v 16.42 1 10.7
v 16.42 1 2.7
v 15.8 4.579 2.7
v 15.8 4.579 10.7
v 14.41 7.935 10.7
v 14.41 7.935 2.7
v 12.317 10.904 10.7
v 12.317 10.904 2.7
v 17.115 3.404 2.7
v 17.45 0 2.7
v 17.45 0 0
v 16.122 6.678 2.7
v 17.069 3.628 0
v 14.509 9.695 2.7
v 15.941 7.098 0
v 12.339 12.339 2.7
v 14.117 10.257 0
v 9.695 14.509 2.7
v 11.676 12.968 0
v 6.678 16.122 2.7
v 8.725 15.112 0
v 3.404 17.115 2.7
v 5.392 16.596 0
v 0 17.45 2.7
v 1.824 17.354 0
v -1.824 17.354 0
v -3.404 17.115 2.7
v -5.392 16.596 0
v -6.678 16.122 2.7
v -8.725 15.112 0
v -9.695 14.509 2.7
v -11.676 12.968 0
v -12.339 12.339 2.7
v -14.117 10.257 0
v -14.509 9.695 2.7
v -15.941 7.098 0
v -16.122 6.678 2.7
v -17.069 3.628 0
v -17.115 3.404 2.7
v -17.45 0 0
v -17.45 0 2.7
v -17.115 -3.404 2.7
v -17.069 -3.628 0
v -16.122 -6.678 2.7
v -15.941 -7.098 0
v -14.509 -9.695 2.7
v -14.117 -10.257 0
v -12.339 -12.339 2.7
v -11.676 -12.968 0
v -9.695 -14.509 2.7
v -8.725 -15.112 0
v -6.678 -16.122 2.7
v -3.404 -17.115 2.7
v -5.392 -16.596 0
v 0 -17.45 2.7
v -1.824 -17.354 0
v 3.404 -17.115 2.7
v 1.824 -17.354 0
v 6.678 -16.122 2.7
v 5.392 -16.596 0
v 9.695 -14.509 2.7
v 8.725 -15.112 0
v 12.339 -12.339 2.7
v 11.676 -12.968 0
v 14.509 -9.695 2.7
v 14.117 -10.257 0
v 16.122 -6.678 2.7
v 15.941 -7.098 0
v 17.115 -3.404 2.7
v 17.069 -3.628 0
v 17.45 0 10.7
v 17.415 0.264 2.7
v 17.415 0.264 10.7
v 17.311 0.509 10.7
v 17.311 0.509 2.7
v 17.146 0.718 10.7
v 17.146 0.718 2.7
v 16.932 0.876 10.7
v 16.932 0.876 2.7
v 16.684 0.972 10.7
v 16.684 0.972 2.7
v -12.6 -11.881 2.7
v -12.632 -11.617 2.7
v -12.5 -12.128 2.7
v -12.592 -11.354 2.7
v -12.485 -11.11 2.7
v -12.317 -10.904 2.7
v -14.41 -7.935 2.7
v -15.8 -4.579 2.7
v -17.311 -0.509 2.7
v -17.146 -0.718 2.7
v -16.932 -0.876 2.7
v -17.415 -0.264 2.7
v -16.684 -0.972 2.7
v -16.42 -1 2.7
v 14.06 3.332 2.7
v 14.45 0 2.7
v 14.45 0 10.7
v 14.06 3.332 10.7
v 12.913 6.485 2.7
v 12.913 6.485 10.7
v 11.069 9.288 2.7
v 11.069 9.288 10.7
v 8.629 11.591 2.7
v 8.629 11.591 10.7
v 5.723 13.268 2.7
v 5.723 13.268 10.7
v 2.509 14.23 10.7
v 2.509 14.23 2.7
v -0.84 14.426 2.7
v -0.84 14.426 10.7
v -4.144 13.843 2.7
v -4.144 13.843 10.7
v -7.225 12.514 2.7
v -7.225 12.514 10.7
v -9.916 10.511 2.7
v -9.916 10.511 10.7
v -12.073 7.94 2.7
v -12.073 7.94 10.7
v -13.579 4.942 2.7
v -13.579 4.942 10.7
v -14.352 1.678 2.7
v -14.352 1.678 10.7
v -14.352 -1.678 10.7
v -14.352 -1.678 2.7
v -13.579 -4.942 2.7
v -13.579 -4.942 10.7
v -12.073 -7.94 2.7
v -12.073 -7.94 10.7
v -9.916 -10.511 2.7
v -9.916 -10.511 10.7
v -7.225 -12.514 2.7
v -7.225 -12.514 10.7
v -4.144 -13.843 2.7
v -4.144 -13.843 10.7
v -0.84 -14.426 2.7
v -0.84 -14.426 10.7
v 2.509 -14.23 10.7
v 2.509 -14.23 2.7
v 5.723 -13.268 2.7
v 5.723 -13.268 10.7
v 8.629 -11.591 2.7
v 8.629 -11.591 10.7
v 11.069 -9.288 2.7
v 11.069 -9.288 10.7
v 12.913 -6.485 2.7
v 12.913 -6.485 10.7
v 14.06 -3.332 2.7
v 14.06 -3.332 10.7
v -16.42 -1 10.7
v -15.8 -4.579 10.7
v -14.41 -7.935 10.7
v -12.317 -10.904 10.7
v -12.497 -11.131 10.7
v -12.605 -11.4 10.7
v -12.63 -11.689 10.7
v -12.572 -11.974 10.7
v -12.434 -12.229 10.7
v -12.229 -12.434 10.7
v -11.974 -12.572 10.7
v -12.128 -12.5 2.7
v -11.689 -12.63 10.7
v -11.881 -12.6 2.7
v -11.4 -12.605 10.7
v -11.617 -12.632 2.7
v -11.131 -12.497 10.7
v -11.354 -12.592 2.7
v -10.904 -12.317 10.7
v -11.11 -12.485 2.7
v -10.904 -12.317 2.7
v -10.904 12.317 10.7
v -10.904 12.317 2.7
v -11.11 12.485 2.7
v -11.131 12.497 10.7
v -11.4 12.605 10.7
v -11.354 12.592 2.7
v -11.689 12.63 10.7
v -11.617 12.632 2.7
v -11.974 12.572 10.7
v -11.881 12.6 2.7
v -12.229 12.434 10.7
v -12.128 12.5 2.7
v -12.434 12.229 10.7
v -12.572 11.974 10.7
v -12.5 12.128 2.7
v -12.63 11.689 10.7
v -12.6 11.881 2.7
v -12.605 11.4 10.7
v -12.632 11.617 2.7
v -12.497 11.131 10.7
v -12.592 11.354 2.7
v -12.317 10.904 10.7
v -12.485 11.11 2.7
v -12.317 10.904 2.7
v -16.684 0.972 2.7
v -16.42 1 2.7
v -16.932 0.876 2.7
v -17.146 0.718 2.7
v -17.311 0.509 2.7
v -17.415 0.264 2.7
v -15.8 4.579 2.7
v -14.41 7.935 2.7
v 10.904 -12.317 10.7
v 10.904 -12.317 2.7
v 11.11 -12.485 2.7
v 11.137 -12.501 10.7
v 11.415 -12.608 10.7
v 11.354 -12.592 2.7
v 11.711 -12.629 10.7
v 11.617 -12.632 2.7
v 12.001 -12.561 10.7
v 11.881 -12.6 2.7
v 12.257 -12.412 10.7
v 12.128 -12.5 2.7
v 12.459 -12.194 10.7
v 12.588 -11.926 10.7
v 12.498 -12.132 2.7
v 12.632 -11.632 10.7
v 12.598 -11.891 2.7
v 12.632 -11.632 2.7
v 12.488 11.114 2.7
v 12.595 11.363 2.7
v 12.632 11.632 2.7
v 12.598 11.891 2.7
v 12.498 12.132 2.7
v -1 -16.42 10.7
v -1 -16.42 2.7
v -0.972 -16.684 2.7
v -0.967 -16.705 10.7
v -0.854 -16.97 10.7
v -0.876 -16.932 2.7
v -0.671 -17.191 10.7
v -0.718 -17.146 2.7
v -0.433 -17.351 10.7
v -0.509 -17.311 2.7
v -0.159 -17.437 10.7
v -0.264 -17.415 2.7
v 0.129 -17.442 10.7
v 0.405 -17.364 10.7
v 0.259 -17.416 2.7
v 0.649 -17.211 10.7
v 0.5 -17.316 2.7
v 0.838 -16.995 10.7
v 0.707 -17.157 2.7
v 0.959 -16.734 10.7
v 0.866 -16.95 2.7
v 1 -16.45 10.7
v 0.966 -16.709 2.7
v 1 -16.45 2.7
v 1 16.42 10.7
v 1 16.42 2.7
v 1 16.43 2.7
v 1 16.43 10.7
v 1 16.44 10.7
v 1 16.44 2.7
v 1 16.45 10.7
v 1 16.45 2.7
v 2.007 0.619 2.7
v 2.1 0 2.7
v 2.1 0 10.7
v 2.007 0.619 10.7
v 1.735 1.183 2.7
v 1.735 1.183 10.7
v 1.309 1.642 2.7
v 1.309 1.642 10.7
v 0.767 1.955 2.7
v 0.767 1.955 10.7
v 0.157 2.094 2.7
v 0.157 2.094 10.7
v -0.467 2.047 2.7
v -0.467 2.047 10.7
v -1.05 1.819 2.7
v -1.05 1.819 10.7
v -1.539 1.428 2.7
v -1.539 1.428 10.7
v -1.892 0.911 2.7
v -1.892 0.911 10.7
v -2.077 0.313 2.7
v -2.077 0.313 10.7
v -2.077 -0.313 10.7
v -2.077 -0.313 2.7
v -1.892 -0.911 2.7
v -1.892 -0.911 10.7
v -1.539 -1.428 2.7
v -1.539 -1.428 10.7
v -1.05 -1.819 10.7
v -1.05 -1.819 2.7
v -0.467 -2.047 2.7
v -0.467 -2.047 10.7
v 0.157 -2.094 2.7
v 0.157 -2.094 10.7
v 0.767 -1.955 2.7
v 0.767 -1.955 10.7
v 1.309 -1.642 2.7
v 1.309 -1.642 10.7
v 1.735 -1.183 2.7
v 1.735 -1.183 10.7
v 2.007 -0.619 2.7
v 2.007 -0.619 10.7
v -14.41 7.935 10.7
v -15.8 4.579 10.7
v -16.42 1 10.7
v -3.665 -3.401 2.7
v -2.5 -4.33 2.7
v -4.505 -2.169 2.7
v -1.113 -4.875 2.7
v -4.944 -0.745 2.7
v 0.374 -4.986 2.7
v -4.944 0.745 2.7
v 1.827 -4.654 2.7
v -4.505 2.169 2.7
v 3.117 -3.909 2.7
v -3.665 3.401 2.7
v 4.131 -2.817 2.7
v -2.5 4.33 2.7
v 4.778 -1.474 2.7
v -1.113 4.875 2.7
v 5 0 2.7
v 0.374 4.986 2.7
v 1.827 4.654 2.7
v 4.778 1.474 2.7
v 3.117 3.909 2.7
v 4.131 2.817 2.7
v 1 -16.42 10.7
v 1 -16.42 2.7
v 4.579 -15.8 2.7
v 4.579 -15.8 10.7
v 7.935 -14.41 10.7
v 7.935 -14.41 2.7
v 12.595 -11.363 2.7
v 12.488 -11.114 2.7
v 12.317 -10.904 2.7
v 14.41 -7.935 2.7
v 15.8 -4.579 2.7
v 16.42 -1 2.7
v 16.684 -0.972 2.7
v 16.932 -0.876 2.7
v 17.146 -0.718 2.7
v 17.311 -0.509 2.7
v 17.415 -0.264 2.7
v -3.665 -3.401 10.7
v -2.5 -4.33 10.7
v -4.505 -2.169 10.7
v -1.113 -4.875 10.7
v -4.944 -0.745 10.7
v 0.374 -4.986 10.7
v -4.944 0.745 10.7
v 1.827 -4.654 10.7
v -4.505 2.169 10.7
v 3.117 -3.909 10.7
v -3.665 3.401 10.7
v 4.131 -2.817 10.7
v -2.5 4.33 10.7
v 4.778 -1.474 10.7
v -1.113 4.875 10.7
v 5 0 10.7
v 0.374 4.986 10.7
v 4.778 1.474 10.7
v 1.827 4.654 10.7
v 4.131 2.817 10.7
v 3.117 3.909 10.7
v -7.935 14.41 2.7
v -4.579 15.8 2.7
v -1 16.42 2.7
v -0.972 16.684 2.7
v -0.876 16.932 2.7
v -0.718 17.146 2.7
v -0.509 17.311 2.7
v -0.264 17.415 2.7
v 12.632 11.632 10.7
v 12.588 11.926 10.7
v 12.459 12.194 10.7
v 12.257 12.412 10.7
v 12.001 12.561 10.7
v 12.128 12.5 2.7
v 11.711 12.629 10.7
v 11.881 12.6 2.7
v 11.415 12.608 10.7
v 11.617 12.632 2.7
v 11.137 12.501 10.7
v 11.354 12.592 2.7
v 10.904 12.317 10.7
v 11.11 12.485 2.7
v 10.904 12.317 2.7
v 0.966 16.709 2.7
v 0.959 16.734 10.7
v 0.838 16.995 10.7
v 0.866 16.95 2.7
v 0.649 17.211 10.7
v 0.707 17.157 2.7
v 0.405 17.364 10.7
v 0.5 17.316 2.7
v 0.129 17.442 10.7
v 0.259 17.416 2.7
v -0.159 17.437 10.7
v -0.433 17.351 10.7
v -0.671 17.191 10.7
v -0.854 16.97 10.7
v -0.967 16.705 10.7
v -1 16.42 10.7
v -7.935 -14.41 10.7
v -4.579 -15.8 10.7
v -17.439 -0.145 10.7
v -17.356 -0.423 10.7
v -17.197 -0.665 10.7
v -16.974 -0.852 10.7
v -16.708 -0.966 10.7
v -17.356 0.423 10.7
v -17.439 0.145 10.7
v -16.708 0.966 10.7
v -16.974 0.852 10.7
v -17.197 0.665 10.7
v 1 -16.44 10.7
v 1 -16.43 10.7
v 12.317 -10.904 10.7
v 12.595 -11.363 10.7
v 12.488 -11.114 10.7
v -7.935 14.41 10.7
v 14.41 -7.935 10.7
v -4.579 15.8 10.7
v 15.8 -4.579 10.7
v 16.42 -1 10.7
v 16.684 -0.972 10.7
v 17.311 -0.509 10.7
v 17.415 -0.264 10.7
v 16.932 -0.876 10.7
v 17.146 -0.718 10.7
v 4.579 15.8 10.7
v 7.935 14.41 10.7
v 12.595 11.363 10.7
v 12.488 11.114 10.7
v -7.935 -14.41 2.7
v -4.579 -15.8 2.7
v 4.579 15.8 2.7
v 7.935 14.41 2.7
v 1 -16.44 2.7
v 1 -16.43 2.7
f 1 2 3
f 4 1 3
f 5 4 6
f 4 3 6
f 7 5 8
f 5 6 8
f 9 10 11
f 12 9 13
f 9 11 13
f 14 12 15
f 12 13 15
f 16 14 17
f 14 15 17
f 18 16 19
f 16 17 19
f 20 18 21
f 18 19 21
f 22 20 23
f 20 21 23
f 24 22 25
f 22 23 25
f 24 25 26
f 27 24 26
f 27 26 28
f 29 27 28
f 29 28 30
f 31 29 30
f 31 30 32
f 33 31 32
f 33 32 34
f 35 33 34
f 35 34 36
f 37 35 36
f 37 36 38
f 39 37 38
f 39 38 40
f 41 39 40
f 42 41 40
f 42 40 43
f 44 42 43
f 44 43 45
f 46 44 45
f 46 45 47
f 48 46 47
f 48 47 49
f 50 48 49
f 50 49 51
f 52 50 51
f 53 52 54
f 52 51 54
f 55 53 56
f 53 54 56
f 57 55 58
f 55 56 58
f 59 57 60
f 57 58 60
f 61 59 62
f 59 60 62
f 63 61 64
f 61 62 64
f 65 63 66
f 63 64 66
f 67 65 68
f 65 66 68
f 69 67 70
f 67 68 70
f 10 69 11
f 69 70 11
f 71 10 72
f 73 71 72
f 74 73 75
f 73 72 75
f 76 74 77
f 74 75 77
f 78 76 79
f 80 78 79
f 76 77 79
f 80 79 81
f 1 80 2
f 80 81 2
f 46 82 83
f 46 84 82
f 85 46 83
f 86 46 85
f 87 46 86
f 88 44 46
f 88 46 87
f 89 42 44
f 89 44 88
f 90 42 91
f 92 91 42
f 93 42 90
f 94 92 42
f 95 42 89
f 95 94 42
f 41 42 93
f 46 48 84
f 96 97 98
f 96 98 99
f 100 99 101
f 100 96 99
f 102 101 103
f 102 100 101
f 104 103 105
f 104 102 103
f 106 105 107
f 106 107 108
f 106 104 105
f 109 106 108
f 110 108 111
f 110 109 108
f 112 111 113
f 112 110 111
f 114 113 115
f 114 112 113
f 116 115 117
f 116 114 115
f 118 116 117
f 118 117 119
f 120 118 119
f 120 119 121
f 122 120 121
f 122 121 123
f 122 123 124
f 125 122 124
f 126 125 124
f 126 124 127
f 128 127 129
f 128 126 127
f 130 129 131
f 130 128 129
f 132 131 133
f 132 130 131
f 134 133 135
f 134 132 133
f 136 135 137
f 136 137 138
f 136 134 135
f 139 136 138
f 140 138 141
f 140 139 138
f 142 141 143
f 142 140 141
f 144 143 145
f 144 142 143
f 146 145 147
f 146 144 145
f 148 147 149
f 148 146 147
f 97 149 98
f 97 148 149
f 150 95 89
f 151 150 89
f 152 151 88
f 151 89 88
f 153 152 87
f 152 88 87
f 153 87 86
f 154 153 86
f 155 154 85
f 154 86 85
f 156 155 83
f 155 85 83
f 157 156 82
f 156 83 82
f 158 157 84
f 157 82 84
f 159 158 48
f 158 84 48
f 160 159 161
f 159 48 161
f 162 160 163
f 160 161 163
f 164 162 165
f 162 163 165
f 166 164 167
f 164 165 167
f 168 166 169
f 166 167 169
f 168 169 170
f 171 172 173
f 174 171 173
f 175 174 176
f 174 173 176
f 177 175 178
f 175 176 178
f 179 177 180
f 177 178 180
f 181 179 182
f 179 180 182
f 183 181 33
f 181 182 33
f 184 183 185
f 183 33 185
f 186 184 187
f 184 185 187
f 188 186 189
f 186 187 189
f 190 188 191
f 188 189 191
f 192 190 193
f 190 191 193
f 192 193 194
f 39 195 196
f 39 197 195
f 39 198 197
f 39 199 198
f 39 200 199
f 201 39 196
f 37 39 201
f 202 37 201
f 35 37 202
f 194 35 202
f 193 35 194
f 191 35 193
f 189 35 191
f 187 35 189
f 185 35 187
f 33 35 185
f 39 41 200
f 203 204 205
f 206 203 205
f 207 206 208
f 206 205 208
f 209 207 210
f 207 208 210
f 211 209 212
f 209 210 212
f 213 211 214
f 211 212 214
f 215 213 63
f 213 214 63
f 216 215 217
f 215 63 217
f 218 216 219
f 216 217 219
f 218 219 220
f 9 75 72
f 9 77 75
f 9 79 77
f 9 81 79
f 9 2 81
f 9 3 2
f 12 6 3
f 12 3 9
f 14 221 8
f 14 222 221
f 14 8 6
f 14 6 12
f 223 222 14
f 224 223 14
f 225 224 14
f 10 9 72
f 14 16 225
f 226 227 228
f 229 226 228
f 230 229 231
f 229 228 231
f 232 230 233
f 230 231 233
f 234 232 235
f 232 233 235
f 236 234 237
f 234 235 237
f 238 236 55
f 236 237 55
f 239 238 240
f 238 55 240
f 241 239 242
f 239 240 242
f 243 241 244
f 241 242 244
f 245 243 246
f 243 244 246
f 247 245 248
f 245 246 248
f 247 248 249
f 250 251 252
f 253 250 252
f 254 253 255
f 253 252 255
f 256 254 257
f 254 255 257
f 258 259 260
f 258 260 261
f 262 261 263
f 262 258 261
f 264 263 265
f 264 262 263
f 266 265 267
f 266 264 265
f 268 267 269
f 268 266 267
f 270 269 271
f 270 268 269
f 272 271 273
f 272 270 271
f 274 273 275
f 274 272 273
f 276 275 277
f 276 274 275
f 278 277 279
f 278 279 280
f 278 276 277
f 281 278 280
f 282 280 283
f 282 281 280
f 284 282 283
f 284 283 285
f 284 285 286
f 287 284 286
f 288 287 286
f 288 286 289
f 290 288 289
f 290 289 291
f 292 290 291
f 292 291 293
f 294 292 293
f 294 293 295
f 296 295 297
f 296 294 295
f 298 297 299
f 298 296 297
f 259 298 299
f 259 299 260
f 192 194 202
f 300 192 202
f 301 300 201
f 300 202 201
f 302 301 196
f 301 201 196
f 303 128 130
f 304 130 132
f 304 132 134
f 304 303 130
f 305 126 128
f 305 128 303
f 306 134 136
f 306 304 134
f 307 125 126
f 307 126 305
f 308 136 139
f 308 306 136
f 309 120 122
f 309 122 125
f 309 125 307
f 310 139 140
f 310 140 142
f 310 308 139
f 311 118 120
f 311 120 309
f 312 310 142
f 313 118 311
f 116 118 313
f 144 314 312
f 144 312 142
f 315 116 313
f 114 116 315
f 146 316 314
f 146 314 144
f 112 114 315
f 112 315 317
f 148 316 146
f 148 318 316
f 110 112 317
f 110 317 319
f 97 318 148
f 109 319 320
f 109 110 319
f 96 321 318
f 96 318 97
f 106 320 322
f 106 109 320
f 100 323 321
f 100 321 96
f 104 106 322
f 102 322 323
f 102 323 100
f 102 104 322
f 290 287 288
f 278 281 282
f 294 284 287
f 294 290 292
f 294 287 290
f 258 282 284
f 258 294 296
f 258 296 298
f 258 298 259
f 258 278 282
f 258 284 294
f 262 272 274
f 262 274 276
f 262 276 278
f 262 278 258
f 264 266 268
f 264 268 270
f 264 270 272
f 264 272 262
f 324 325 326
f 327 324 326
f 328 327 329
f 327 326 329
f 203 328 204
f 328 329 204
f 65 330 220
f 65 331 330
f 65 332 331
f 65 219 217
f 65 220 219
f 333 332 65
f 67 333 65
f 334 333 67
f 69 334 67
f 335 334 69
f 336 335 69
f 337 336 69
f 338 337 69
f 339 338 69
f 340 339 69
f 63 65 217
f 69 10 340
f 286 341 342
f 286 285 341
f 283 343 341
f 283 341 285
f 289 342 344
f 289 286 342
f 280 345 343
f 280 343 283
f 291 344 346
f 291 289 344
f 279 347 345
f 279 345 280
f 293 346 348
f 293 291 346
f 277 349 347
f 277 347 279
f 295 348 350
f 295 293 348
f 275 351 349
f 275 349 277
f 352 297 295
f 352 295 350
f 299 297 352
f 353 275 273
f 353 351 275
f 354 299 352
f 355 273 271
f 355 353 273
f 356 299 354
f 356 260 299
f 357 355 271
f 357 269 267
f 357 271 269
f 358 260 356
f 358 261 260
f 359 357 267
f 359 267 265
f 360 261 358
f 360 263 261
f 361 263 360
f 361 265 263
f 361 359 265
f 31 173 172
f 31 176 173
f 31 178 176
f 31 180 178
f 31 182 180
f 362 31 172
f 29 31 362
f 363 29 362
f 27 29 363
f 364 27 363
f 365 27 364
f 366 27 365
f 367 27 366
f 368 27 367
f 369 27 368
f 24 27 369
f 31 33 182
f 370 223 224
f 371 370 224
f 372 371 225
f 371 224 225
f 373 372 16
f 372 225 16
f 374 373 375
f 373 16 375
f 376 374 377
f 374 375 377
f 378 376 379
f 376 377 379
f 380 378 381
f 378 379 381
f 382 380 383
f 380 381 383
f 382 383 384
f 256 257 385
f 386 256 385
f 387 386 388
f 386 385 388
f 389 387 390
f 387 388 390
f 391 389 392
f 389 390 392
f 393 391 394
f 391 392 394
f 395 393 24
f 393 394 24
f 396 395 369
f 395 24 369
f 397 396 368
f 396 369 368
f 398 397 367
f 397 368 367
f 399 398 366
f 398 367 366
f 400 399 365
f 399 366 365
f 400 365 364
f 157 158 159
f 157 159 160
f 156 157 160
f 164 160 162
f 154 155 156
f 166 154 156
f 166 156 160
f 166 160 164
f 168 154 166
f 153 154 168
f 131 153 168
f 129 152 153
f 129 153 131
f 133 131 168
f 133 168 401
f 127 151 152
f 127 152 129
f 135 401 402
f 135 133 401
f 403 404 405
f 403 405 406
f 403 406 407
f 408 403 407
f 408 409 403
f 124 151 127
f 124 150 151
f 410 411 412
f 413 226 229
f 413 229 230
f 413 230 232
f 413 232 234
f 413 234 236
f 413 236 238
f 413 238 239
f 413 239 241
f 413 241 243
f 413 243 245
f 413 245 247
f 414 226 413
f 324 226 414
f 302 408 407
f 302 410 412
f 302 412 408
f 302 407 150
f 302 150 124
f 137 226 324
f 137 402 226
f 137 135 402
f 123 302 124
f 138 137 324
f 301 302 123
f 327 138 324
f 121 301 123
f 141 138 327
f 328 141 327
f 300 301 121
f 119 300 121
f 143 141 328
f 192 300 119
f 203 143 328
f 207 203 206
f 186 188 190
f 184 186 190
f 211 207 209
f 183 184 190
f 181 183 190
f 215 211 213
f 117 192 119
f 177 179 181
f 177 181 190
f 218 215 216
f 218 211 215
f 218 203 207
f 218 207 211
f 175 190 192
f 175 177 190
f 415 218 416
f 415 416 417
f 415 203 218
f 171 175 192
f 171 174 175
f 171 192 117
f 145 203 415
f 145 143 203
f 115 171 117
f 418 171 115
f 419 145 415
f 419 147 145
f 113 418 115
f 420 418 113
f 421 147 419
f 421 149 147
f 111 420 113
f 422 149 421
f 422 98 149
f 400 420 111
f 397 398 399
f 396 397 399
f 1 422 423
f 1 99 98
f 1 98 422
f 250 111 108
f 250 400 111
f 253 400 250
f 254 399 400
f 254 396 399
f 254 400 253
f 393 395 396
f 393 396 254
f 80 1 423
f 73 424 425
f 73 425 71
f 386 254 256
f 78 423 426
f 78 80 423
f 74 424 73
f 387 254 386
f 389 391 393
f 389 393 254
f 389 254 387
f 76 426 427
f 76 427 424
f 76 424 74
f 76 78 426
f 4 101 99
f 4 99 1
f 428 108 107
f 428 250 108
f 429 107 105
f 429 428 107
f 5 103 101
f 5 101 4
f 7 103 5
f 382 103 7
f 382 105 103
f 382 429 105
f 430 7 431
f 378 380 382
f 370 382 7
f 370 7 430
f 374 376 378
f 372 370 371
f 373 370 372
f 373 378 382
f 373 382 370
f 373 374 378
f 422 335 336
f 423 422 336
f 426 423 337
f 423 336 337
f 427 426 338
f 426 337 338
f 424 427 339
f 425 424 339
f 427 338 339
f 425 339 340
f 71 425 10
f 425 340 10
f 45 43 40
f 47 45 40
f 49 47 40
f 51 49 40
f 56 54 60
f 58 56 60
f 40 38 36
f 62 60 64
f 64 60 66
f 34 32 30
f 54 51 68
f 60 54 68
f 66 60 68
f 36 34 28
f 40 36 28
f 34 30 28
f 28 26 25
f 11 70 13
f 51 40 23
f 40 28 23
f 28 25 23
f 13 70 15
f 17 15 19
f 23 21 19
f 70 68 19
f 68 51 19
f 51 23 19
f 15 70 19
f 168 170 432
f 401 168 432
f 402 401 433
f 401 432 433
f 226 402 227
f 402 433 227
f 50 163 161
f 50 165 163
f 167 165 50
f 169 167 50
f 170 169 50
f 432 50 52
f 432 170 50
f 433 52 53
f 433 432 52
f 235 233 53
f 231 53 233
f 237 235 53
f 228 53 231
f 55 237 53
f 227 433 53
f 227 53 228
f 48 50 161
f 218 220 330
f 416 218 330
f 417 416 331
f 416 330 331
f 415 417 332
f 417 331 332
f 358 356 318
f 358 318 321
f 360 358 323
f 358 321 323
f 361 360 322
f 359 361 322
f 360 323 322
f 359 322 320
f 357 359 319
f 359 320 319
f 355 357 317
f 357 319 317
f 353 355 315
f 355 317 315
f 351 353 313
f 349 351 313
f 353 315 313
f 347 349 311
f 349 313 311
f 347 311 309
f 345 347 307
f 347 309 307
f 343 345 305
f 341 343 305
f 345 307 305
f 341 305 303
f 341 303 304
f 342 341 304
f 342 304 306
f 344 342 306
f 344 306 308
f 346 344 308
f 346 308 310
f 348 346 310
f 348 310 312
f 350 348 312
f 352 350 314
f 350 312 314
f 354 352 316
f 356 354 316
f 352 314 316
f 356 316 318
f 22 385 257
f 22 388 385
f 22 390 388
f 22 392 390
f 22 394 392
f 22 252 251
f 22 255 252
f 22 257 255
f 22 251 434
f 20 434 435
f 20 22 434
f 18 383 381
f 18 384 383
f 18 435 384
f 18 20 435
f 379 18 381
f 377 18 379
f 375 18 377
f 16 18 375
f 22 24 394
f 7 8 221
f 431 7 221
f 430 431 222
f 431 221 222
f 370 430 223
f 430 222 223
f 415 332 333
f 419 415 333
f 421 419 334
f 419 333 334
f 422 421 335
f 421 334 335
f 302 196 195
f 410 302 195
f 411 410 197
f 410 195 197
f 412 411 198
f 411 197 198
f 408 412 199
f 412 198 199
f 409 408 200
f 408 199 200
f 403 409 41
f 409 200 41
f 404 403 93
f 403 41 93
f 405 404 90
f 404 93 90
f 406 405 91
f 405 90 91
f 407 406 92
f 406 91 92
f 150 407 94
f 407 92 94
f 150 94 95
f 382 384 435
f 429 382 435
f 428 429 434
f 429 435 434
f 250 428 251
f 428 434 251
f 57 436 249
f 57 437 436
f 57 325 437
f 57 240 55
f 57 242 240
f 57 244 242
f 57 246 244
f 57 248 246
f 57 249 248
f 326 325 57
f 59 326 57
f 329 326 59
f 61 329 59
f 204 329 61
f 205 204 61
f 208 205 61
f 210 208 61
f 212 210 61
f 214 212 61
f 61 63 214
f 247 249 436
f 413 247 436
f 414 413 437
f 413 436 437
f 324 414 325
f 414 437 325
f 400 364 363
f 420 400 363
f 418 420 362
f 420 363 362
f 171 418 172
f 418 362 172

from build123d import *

# Parameters (mm, degrees)
F0_R     = 17.45
F1_DEPTH = 2.7
F2_R     = 14.45
F3_DEPTH = 8
F4_R     = 5
F4_R_2   = 2.1
F5_DEPTH = 8


with BuildPart() as f1:
    # F0 (on Top) → F1 (new body)
    with BuildSketch(Plane.XY):
        Circle(F0_R)
    extrude(amount=F1_DEPTH)

    # F2 (on face) → F3 (join)
    with BuildSketch(Plane.XY.offset(2.7)):
        with BuildLine():
            ThreePointArc((16.4196048632, -0.9995379611), (16.4423994599, -0.5), (16.45, 0))
            ThreePointArc((16.45, 0), (16.4423994599, 0.5), (16.4196048632, 0.9995379611))
            ThreePointArc((16.4196048632, 0.9995379611), (15.45, 0), (16.4196048632, -0.9995379611))
        make_face()
        with BuildLine():
            ThreePointArc((16.4196048632, 0.9995379611), (16.4423994599, 0.5), (16.45, 0))
            ThreePointArc((16.45, 0), (16.4423994599, -0.5), (16.4196048632, -0.9995379611))
            ThreePointArc((16.4196048632, -0.9995379611), (17.1462775536, -0.7177726439), (17.45, 0))
            ThreePointArc((17.45, 0), (17.1462775536, 0.7177726439), (16.4196048632, 0.9995379611))
        make_face()
        with BuildLine():
            ThreePointArc((16.4196048632, -0.9995379611), (15.45, 0), (16.4196048632, 0.9995379611))
            ThreePointArc((16.4196048632, 0.9995379611), (15.1978183098, 6.2951424624), (12.3171940135, 10.9036338728))
            ThreePointArc((12.3171940135, 10.9036338728), (10.9247997693, 10.9247997693), (10.9036338728, 12.3171940135))
            ThreePointArc((10.9036338728, 12.3171940135), (6.2951424624, 15.1978183098), (0.9995379611, 16.4196048632))
            ThreePointArc((0.9995379611, 16.4196048632), (0, 15.45), (-0.9995379611, 16.4196048632))
            ThreePointArc((-0.9995379611, 16.4196048632), (-6.2951424624, 15.1978183098), (-10.9036338728, 12.3171940135))
            ThreePointArc((-10.9036338728, 12.3171940135), (-10.7023172117, 12.0005034322), (-10.6319065505, 11.6319065505))
            ThreePointArc((-10.6319065505, 11.6319065505), (-11.2352249799, 10.7139502708), (-12.3171940135, 10.9036338728))
            ThreePointArc((-12.3171940135, 10.9036338728), (-15.1978183098, 6.2951424624), (-16.4196048632, 0.9995379611))
            ThreePointArc((-16.4196048632, 0.9995379611), (-15.7322273561, 0.6962775536), (-15.45, 0))
            ThreePointArc((-15.45, 0), (-15.7322273561, -0.6962775536), (-16.4196048632, -0.9995379611))
            ThreePointArc((-16.4196048632, -0.9995379611), (-15.1978183098, -6.2951424624), (-12.3171940135, -10.9036338728))
            ThreePointArc((-12.3171940135, -10.9036338728), (-11.2352249799, -10.7139502708), (-10.6319065505, -11.6319065505))
            ThreePointArc((-10.6319065505, -11.6319065505), (-10.7023172117, -12.0005034322), (-10.9036338728, -12.3171940135))
            ThreePointArc((-10.9036338728, -12.3171940135), (-6.2951424624, -15.1978183098), (-0.9995379611, -16.4196048632))
            ThreePointArc((-0.9995379611, -16.4196048632), (0, -15.45), (0.9995379611, -16.4196048632))
            ThreePointArc((0.9995379611, -16.4196048632), (6.2951424624, -15.1978183098), (10.9036338728, -12.3171940135))
            ThreePointArc((10.9036338728, -12.3171940135), (10.9247997693, -10.9247997693), (12.3171940135, -10.9036338728))
            ThreePointArc((12.3171940135, -10.9036338728), (15.1978183098, -6.2951424624), (16.4196048632, -0.9995379611))
        make_face()
        Circle(F2_R, mode=Mode.SUBTRACT)
        with BuildLine():
            ThreePointArc((10.9036338728, 12.3171940135), (10.9247997693, 10.9247997693), (12.3171940135, 10.9036338728))
            ThreePointArc((12.3171940135, 10.9036338728), (11.6319065505, 11.6319065505), (10.9036338728, 12.3171940135))
        make_face()
        with BuildLine():
            ThreePointArc((10.9036338728, 12.3171940135), (11.6319065505, 11.6319065505), (12.3171940135, 10.9036338728))
            ThreePointArc((12.3171940135, 10.9036338728), (12.5498628303, 11.2352249799), (12.6319065505, 11.6319065505))
            ThreePointArc((12.6319065505, 11.6319065505), (12.0005034322, 12.5614958893), (10.9036338728, 12.3171940135))
        make_face()
        with BuildLine():
            ThreePointArc((12.6319065505, -11.6319065505), (12.5498628303, -11.2352249799), (12.3171940135, -10.9036338728))
            ThreePointArc((12.3171940135, -10.9036338728), (11.6319065505, -11.6319065505), (10.9036338728, -12.3171940135))
            ThreePointArc((10.9036338728, -12.3171940135), (12.0005034322, -12.5614958893), (12.6319065505, -11.6319065505))
        make_face()
        with BuildLine():
            ThreePointArc((10.9036338728, -12.3171940135), (11.6319065505, -11.6319065505), (12.3171940135, -10.9036338728))
            ThreePointArc((12.3171940135, -10.9036338728), (10.9247997693, -10.9247997693), (10.9036338728, -12.3171940135))
        make_face()
        with BuildLine():
            ThreePointArc((-0.9995379611, 16.4196048632), (0, 15.45), (0.9995379611, 16.4196048632))
            ThreePointArc((0.9995379611, 16.4196048632), (0, 16.45), (-0.9995379611, 16.4196048632))
        make_face()
        with BuildLine():
            ThreePointArc((-0.9995379611, 16.4196048632), (0, 16.45), (0.9995379611, 16.4196048632))
            ThreePointArc((0.9995379611, 16.4196048632), (0.9998844836, 16.4348006758), (1, 16.45))
            ThreePointArc((1, 16.45), (-0.0151993242, 17.4498844836), (-0.9995379611, 16.4196048632))
        make_face()
        with BuildLine():
            ThreePointArc((1, -16.45), (0.9998844836, -16.4348006758), (0.9995379611, -16.4196048632))
            ThreePointArc((0.9995379611, -16.4196048632), (0, -16.45), (-0.9995379611, -16.4196048632))
            ThreePointArc((-0.9995379611, -16.4196048632), (-0.0151993242, -17.4498844836), (1, -16.45))
        make_face()
        with BuildLine():
            ThreePointArc((-0.9995379611, -16.4196048632), (0, -16.45), (0.9995379611, -16.4196048632))
            ThreePointArc((0.9995379611, -16.4196048632), (0, -15.45), (-0.9995379611, -16.4196048632))
        make_face()
        with BuildLine():
            ThreePointArc((-10.6319065505, 11.6319065505), (-10.7023172117, 12.0005034322), (-10.9036338728, 12.3171940135))
            ThreePointArc((-10.9036338728, 12.3171940135), (-11.6319065505, 11.6319065505), (-12.3171940135, 10.9036338728))
            ThreePointArc((-12.3171940135, 10.9036338728), (-11.2352249799, 10.7139502708), (-10.6319065505, 11.6319065505))
        make_face()
        with BuildLine():
            ThreePointArc((-12.3171940135, 10.9036338728), (-11.6319065505, 11.6319065505), (-10.9036338728, 12.3171940135))
            ThreePointArc((-10.9036338728, 12.3171940135), (-12.3390133317, 12.3390133317), (-12.3171940135, 10.9036338728))
        make_face()
        with BuildLine():
            ThreePointArc((-12.3171940135, -10.9036338728), (-12.3390133317, -12.3390133317), (-10.9036338728, -12.3171940135))
            ThreePointArc((-10.9036338728, -12.3171940135), (-11.6319065505, -11.6319065505), (-12.3171940135, -10.9036338728))
        make_face()
        with BuildLine():
            ThreePointArc((-12.3171940135, -10.9036338728), (-11.6319065505, -11.6319065505), (-10.9036338728, -12.3171940135))
            ThreePointArc((-10.9036338728, -12.3171940135), (-10.7023172117, -12.0005034322), (-10.6319065505, -11.6319065505))
            ThreePointArc((-10.6319065505, -11.6319065505), (-11.2352249799, -10.7139502708), (-12.3171940135, -10.9036338728))
        make_face()
        with BuildLine():
            ThreePointArc((-15.45, 0), (-15.7322273561, 0.6962775536), (-16.4196048632, 0.9995379611))
            ThreePointArc((-16.4196048632, 0.9995379611), (-16.45, 0), (-16.4196048632, -0.9995379611))
            ThreePointArc((-16.4196048632, -0.9995379611), (-15.7322273561, -0.6962775536), (-15.45, 0))
        make_face()
        with BuildLine():
            ThreePointArc((-16.4196048632, -0.9995379611), (-16.45, 0), (-16.4196048632, 0.9995379611))
            ThreePointArc((-16.4196048632, 0.9995379611), (-17.45, 0), (-16.4196048632, -0.9995379611))
        make_face()
    extrude(amount=F3_DEPTH)

    # F4 (on face) → F5 (join)
    with BuildSketch(Plane.XY.offset(2.7)):
        Circle(F4_R)
        Circle(F4_R_2, mode=Mode.SUBTRACT)
    extrude(amount=F5_DEPTH)


solid = f1.part
